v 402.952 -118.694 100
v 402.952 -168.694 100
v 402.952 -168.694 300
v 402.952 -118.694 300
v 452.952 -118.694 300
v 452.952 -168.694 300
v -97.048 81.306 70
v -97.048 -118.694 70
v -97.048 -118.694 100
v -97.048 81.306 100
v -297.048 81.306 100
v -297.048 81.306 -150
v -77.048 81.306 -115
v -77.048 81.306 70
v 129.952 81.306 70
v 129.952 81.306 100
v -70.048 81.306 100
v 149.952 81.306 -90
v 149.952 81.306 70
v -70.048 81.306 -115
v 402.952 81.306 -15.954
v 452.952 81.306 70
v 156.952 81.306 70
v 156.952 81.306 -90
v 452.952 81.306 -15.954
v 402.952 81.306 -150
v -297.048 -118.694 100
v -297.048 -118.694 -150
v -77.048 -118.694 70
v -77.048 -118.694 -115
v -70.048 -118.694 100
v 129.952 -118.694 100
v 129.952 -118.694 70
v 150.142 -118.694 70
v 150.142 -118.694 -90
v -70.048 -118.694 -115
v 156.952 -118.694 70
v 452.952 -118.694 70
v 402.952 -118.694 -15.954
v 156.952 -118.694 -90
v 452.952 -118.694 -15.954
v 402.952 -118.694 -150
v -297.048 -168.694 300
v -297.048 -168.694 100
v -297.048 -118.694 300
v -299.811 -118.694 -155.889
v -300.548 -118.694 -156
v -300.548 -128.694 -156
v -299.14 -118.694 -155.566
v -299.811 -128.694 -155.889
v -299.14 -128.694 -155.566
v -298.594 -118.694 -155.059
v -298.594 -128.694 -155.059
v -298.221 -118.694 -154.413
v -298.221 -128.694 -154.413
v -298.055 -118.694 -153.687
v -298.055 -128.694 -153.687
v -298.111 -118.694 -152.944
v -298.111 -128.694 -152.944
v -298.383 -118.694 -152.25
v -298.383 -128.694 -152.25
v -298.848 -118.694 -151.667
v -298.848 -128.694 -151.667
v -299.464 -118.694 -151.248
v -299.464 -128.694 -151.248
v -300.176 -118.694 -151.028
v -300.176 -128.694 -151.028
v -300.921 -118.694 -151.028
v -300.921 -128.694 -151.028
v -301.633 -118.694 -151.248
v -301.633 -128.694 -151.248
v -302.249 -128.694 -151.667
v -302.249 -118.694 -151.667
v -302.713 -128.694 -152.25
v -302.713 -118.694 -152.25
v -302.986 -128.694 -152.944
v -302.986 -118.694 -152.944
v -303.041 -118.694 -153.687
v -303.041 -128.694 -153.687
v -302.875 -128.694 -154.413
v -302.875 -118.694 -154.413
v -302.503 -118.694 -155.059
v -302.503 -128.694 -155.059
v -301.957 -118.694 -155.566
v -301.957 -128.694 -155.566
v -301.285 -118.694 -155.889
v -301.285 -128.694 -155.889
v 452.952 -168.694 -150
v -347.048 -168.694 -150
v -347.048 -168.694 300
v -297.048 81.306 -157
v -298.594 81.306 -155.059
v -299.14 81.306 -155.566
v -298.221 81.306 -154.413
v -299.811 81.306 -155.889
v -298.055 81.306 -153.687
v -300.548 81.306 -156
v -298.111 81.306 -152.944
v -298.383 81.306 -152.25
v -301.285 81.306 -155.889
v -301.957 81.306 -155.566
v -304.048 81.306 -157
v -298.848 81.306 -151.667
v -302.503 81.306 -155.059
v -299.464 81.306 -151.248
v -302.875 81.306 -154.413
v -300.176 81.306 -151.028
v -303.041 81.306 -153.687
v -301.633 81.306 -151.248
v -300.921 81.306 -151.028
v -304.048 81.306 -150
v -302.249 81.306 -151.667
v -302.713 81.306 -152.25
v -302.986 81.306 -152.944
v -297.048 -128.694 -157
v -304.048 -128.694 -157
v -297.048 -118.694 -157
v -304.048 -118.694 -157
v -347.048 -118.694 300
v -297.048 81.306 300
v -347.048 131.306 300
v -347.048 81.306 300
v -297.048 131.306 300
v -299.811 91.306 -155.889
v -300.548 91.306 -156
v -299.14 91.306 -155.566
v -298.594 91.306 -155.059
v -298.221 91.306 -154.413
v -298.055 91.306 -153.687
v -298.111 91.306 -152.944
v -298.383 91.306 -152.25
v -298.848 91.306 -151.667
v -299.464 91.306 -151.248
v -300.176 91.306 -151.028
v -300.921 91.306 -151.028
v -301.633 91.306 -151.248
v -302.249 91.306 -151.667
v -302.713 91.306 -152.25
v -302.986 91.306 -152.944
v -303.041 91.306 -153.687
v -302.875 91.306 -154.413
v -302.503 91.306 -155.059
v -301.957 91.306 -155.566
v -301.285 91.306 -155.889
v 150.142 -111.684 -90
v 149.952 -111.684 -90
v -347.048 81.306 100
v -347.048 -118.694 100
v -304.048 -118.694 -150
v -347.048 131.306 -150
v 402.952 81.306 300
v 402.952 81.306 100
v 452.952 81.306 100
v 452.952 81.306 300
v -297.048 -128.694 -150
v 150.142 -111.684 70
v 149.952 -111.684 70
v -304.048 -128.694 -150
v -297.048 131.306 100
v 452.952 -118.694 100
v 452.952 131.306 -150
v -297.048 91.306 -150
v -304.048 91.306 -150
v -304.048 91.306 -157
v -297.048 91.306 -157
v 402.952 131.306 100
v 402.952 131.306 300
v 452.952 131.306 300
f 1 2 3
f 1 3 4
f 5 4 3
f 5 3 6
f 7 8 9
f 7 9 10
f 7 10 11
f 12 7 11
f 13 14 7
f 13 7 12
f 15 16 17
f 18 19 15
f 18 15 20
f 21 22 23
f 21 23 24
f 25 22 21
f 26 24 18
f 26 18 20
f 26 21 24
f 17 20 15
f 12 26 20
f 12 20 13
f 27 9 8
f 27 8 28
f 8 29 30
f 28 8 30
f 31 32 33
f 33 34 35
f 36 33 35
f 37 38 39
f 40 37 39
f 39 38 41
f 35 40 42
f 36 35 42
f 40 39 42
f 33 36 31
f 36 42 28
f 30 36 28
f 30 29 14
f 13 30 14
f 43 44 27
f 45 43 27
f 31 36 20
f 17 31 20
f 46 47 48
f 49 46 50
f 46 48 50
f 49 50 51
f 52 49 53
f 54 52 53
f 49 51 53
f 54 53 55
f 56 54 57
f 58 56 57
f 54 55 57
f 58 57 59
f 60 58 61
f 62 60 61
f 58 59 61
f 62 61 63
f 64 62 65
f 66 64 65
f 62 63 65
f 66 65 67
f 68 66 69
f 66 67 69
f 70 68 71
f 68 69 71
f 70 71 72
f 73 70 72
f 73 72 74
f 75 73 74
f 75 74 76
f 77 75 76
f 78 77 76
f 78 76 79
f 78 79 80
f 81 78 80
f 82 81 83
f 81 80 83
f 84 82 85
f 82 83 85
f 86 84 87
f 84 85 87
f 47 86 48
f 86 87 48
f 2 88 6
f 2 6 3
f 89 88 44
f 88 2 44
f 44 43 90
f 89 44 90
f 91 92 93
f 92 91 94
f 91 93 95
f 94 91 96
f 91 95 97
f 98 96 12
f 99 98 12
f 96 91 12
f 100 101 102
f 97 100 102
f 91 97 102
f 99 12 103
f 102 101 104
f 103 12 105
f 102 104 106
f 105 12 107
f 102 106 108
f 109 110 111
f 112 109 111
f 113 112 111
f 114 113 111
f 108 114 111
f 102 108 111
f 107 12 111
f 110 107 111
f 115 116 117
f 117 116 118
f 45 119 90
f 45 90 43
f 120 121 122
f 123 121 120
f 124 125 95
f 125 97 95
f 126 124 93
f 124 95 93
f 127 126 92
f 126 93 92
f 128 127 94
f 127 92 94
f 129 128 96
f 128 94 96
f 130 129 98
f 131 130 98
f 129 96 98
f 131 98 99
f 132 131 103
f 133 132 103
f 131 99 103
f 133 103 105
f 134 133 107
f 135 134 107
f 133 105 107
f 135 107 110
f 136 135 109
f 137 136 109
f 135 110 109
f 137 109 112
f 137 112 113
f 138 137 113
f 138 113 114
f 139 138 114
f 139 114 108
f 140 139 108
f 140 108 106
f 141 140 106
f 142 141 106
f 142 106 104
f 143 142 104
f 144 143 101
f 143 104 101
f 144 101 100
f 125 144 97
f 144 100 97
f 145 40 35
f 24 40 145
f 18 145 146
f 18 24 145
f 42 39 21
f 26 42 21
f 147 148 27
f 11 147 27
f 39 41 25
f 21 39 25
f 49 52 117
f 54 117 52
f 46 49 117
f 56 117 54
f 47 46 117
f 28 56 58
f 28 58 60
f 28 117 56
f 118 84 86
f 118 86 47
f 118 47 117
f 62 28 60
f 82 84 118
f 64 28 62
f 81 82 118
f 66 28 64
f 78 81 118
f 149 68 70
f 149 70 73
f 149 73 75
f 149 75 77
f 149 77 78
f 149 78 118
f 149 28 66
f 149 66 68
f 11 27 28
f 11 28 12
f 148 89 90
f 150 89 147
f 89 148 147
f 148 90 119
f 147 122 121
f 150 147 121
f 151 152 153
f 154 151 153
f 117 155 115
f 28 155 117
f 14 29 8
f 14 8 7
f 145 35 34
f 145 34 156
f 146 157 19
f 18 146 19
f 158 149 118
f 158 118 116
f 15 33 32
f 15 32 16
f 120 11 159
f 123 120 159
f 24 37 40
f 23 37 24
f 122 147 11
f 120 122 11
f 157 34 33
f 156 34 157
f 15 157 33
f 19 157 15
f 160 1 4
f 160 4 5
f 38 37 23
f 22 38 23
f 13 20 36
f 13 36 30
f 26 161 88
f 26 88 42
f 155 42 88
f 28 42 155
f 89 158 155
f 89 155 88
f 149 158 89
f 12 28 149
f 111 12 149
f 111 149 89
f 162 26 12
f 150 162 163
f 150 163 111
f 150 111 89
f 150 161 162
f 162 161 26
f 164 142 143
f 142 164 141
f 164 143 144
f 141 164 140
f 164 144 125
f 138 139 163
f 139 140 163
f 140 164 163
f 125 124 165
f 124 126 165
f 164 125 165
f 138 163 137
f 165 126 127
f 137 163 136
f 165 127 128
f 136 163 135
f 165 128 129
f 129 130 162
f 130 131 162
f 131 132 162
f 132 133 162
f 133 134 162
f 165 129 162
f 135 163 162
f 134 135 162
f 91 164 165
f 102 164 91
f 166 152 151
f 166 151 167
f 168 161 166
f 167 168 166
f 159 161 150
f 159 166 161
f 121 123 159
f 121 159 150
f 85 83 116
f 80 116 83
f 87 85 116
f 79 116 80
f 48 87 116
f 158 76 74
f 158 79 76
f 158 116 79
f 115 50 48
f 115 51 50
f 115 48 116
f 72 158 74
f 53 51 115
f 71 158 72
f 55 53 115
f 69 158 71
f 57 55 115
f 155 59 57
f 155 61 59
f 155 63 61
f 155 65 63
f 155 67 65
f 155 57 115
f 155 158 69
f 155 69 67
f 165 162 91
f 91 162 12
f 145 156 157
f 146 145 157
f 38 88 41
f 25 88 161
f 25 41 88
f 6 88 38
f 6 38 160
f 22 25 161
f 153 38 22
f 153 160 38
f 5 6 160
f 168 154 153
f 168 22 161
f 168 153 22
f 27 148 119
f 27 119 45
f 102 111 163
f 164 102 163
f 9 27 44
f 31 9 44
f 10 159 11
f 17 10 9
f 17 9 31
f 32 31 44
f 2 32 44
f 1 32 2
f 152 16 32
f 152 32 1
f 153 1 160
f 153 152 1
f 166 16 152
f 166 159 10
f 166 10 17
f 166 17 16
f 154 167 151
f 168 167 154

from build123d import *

# Parameters (mm, degrees)
SKETCH2_W            = 800
SKETCH2_H            = 300
BOSS_EXTRUDE1_DEPTH  = 100
SKETCH3_W            = 50
SKETCH3_H            = 50
BOSS_EXTRUDE2_DEPTH  = 200
SKETCH4_W            = 800
SKETCH4_H            = 300
SKETCH4_W_2          = 700
SKETCH4_H_2          = 200
BOSS_EXTRUDE3_DEPTH  = 150
SKETCH5_W            = 85.954447183
SKETCH5_H            = 200
CUT_EXTRUDE1_DEPTH   = 750
SKETCH6_W            = 7
SKETCH6_H            = 200
BOSS_EXTRUDE5_DEPTH  = 185
SKETCH9_W            = 7
SKETCH9_H            = 192.990182273
BOSS_EXTRUDE6_DEPTH  = 160
SKETCH12_W           = 200
SKETCH12_H           = 200
CUT_EXTRUDE4_DEPTH   = 111
SKETCH14_W           = 6.809905138
SKETCH14_H           = 7.009817727
BOSS_EXTRUDE9_DEPTH  = 160
BOSS_EXTRUDE10_DEPTH = 7
F_3DSKETCH2_R        = 2.5
CUT_EXTRUDE5_DEPTH   = 263.5


with BuildPart() as part:
    # Sketch2 → Boss-Extrude1 (new body)
    with BuildSketch(Plane.XY):
        with Locations((52.951699463, -18.694096601)):
            Rectangle(SKETCH2_W, SKETCH2_H)
    extrude(amount=BOSS_EXTRUDE1_DEPTH)

    # Sketch3 → Boss-Extrude2 (add)
    with BuildSketch(Plane.XY.offset(100)):
        with Locations((-322.048300537, 106.305903399)):
            Rectangle(SKETCH3_W, SKETCH3_H)
        with Locations((-322.048300537, -143.694096601)):
            Rectangle(SKETCH3_W, SKETCH3_H)
        with Locations((427.951699463, 106.305903399)):
            Rectangle(SKETCH3_W, SKETCH3_H)
        with Locations((427.951699463, -143.694096601)):
            Rectangle(SKETCH3_W, SKETCH3_H)
    extrude(amount=BOSS_EXTRUDE2_DEPTH)

    # Sketch4 → Boss-Extrude3 (add)
    with BuildSketch(Plane(origin=(0, 0, 0), x_dir=(-1, 0, 0), z_dir=(0, 0, -1))):
        with Locations((-52.951699463, -18.694096601)):
            Rectangle(SKETCH4_W, SKETCH4_H)
        with Locations((-52.951699463, -18.694096601)):
            Rectangle(SKETCH4_W_2, SKETCH4_H_2, mode=Mode.SUBTRACT)
    extrude(amount=BOSS_EXTRUDE3_DEPTH)

    # Sketch5 → Cut-Extrude1 (cut)
    with BuildSketch(Plane(origin=(452.951699463, 0, 0), x_dir=(0, 0, -1), z_dir=(1, 0, 0))):
        with Locations((-27.022776409, -18.694096601)):
            Rectangle(SKETCH5_W, SKETCH5_H)
    extrude(amount=-CUT_EXTRUDE1_DEPTH, mode=Mode.SUBTRACT)

    # Sketch6 → Boss-Extrude5 (add)
    with BuildSketch(Plane(origin=(0, 0, 70), x_dir=(-1, 0, 0), z_dir=(0, 0, -1))):
        with Locations((73.548300537, -18.694096601)):
            Rectangle(SKETCH6_W, SKETCH6_H)
    extrude(amount=BOSS_EXTRUDE5_DEPTH)

    # Sketch9 → Boss-Extrude6 (add)
    with BuildSketch(Plane(origin=(0, 0, 70), x_dir=(-1, 0, 0), z_dir=(0, 0, -1))):
        with Locations((-153.451699463, -15.189187737)):
            Rectangle(SKETCH9_W, SKETCH9_H)
    extrude(amount=BOSS_EXTRUDE6_DEPTH)

    # Sketch12 → Cut-Extrude4 (cut)
    with BuildSketch(Plane(origin=(0, 0, 70), x_dir=(-1, 0, 0), z_dir=(0, 0, -1))):
        with Locations((197.048300537, -18.694096601)):
            Rectangle(SKETCH12_W, SKETCH12_H)
        with Locations((-29.951699463, -18.694096601)):
            Rectangle(SKETCH12_W, SKETCH12_H)
    extrude(amount=-CUT_EXTRUDE4_DEPTH, mode=Mode.SUBTRACT)

    # Sketch14 → Boss-Extrude9 (add)
    with BuildSketch(Plane(origin=(0, 0, 70), x_dir=(-1, 0, 0), z_dir=(0, 0, -1))):
        with Locations((-153.546746894, -115.189187738)):
            Rectangle(SKETCH14_W, SKETCH14_H)
    extrude(amount=BOSS_EXTRUDE9_DEPTH)

    # 3DSketch1 → Boss-Extrude10 (add)
    with BuildSketch(Plane(origin=(-297.048300537, 81.305903399, -150), x_dir=(-0.033314830232638246, -0.9994449069791543, 0), z_dir=(0, 0, -1))):
        Polygon((0, 0), (0.233203812, 6.996114349), (-9.761245258, 7.329262651), (-9.99444907, 0.333148302), align=None)
        Polygon((199.888981396, -6.662966047), (200.122185207, 0.333148302), (210.116634277, 0), (209.883430466, -6.996114349), align=None)
    extrude(amount=BOSS_EXTRUDE10_DEPTH)

    # 3DSketch2 → Cut-Extrude5 (cut, symmetric)
    with BuildSketch(Plane(origin=(-297.048300537, -128.694096601, -157), x_dir=(-0.7071067811865476, 0, 0.7071067811865476), z_dir=(0, -1, 0))):
        with Locations(Location((4.949747468, 0, 0), (0, 0, 135))):
            Circle(F_3DSKETCH2_R)
    extrude(amount=CUT_EXTRUDE5_DEPTH, both=True, mode=Mode.SUBTRACT)


solid = part.part
